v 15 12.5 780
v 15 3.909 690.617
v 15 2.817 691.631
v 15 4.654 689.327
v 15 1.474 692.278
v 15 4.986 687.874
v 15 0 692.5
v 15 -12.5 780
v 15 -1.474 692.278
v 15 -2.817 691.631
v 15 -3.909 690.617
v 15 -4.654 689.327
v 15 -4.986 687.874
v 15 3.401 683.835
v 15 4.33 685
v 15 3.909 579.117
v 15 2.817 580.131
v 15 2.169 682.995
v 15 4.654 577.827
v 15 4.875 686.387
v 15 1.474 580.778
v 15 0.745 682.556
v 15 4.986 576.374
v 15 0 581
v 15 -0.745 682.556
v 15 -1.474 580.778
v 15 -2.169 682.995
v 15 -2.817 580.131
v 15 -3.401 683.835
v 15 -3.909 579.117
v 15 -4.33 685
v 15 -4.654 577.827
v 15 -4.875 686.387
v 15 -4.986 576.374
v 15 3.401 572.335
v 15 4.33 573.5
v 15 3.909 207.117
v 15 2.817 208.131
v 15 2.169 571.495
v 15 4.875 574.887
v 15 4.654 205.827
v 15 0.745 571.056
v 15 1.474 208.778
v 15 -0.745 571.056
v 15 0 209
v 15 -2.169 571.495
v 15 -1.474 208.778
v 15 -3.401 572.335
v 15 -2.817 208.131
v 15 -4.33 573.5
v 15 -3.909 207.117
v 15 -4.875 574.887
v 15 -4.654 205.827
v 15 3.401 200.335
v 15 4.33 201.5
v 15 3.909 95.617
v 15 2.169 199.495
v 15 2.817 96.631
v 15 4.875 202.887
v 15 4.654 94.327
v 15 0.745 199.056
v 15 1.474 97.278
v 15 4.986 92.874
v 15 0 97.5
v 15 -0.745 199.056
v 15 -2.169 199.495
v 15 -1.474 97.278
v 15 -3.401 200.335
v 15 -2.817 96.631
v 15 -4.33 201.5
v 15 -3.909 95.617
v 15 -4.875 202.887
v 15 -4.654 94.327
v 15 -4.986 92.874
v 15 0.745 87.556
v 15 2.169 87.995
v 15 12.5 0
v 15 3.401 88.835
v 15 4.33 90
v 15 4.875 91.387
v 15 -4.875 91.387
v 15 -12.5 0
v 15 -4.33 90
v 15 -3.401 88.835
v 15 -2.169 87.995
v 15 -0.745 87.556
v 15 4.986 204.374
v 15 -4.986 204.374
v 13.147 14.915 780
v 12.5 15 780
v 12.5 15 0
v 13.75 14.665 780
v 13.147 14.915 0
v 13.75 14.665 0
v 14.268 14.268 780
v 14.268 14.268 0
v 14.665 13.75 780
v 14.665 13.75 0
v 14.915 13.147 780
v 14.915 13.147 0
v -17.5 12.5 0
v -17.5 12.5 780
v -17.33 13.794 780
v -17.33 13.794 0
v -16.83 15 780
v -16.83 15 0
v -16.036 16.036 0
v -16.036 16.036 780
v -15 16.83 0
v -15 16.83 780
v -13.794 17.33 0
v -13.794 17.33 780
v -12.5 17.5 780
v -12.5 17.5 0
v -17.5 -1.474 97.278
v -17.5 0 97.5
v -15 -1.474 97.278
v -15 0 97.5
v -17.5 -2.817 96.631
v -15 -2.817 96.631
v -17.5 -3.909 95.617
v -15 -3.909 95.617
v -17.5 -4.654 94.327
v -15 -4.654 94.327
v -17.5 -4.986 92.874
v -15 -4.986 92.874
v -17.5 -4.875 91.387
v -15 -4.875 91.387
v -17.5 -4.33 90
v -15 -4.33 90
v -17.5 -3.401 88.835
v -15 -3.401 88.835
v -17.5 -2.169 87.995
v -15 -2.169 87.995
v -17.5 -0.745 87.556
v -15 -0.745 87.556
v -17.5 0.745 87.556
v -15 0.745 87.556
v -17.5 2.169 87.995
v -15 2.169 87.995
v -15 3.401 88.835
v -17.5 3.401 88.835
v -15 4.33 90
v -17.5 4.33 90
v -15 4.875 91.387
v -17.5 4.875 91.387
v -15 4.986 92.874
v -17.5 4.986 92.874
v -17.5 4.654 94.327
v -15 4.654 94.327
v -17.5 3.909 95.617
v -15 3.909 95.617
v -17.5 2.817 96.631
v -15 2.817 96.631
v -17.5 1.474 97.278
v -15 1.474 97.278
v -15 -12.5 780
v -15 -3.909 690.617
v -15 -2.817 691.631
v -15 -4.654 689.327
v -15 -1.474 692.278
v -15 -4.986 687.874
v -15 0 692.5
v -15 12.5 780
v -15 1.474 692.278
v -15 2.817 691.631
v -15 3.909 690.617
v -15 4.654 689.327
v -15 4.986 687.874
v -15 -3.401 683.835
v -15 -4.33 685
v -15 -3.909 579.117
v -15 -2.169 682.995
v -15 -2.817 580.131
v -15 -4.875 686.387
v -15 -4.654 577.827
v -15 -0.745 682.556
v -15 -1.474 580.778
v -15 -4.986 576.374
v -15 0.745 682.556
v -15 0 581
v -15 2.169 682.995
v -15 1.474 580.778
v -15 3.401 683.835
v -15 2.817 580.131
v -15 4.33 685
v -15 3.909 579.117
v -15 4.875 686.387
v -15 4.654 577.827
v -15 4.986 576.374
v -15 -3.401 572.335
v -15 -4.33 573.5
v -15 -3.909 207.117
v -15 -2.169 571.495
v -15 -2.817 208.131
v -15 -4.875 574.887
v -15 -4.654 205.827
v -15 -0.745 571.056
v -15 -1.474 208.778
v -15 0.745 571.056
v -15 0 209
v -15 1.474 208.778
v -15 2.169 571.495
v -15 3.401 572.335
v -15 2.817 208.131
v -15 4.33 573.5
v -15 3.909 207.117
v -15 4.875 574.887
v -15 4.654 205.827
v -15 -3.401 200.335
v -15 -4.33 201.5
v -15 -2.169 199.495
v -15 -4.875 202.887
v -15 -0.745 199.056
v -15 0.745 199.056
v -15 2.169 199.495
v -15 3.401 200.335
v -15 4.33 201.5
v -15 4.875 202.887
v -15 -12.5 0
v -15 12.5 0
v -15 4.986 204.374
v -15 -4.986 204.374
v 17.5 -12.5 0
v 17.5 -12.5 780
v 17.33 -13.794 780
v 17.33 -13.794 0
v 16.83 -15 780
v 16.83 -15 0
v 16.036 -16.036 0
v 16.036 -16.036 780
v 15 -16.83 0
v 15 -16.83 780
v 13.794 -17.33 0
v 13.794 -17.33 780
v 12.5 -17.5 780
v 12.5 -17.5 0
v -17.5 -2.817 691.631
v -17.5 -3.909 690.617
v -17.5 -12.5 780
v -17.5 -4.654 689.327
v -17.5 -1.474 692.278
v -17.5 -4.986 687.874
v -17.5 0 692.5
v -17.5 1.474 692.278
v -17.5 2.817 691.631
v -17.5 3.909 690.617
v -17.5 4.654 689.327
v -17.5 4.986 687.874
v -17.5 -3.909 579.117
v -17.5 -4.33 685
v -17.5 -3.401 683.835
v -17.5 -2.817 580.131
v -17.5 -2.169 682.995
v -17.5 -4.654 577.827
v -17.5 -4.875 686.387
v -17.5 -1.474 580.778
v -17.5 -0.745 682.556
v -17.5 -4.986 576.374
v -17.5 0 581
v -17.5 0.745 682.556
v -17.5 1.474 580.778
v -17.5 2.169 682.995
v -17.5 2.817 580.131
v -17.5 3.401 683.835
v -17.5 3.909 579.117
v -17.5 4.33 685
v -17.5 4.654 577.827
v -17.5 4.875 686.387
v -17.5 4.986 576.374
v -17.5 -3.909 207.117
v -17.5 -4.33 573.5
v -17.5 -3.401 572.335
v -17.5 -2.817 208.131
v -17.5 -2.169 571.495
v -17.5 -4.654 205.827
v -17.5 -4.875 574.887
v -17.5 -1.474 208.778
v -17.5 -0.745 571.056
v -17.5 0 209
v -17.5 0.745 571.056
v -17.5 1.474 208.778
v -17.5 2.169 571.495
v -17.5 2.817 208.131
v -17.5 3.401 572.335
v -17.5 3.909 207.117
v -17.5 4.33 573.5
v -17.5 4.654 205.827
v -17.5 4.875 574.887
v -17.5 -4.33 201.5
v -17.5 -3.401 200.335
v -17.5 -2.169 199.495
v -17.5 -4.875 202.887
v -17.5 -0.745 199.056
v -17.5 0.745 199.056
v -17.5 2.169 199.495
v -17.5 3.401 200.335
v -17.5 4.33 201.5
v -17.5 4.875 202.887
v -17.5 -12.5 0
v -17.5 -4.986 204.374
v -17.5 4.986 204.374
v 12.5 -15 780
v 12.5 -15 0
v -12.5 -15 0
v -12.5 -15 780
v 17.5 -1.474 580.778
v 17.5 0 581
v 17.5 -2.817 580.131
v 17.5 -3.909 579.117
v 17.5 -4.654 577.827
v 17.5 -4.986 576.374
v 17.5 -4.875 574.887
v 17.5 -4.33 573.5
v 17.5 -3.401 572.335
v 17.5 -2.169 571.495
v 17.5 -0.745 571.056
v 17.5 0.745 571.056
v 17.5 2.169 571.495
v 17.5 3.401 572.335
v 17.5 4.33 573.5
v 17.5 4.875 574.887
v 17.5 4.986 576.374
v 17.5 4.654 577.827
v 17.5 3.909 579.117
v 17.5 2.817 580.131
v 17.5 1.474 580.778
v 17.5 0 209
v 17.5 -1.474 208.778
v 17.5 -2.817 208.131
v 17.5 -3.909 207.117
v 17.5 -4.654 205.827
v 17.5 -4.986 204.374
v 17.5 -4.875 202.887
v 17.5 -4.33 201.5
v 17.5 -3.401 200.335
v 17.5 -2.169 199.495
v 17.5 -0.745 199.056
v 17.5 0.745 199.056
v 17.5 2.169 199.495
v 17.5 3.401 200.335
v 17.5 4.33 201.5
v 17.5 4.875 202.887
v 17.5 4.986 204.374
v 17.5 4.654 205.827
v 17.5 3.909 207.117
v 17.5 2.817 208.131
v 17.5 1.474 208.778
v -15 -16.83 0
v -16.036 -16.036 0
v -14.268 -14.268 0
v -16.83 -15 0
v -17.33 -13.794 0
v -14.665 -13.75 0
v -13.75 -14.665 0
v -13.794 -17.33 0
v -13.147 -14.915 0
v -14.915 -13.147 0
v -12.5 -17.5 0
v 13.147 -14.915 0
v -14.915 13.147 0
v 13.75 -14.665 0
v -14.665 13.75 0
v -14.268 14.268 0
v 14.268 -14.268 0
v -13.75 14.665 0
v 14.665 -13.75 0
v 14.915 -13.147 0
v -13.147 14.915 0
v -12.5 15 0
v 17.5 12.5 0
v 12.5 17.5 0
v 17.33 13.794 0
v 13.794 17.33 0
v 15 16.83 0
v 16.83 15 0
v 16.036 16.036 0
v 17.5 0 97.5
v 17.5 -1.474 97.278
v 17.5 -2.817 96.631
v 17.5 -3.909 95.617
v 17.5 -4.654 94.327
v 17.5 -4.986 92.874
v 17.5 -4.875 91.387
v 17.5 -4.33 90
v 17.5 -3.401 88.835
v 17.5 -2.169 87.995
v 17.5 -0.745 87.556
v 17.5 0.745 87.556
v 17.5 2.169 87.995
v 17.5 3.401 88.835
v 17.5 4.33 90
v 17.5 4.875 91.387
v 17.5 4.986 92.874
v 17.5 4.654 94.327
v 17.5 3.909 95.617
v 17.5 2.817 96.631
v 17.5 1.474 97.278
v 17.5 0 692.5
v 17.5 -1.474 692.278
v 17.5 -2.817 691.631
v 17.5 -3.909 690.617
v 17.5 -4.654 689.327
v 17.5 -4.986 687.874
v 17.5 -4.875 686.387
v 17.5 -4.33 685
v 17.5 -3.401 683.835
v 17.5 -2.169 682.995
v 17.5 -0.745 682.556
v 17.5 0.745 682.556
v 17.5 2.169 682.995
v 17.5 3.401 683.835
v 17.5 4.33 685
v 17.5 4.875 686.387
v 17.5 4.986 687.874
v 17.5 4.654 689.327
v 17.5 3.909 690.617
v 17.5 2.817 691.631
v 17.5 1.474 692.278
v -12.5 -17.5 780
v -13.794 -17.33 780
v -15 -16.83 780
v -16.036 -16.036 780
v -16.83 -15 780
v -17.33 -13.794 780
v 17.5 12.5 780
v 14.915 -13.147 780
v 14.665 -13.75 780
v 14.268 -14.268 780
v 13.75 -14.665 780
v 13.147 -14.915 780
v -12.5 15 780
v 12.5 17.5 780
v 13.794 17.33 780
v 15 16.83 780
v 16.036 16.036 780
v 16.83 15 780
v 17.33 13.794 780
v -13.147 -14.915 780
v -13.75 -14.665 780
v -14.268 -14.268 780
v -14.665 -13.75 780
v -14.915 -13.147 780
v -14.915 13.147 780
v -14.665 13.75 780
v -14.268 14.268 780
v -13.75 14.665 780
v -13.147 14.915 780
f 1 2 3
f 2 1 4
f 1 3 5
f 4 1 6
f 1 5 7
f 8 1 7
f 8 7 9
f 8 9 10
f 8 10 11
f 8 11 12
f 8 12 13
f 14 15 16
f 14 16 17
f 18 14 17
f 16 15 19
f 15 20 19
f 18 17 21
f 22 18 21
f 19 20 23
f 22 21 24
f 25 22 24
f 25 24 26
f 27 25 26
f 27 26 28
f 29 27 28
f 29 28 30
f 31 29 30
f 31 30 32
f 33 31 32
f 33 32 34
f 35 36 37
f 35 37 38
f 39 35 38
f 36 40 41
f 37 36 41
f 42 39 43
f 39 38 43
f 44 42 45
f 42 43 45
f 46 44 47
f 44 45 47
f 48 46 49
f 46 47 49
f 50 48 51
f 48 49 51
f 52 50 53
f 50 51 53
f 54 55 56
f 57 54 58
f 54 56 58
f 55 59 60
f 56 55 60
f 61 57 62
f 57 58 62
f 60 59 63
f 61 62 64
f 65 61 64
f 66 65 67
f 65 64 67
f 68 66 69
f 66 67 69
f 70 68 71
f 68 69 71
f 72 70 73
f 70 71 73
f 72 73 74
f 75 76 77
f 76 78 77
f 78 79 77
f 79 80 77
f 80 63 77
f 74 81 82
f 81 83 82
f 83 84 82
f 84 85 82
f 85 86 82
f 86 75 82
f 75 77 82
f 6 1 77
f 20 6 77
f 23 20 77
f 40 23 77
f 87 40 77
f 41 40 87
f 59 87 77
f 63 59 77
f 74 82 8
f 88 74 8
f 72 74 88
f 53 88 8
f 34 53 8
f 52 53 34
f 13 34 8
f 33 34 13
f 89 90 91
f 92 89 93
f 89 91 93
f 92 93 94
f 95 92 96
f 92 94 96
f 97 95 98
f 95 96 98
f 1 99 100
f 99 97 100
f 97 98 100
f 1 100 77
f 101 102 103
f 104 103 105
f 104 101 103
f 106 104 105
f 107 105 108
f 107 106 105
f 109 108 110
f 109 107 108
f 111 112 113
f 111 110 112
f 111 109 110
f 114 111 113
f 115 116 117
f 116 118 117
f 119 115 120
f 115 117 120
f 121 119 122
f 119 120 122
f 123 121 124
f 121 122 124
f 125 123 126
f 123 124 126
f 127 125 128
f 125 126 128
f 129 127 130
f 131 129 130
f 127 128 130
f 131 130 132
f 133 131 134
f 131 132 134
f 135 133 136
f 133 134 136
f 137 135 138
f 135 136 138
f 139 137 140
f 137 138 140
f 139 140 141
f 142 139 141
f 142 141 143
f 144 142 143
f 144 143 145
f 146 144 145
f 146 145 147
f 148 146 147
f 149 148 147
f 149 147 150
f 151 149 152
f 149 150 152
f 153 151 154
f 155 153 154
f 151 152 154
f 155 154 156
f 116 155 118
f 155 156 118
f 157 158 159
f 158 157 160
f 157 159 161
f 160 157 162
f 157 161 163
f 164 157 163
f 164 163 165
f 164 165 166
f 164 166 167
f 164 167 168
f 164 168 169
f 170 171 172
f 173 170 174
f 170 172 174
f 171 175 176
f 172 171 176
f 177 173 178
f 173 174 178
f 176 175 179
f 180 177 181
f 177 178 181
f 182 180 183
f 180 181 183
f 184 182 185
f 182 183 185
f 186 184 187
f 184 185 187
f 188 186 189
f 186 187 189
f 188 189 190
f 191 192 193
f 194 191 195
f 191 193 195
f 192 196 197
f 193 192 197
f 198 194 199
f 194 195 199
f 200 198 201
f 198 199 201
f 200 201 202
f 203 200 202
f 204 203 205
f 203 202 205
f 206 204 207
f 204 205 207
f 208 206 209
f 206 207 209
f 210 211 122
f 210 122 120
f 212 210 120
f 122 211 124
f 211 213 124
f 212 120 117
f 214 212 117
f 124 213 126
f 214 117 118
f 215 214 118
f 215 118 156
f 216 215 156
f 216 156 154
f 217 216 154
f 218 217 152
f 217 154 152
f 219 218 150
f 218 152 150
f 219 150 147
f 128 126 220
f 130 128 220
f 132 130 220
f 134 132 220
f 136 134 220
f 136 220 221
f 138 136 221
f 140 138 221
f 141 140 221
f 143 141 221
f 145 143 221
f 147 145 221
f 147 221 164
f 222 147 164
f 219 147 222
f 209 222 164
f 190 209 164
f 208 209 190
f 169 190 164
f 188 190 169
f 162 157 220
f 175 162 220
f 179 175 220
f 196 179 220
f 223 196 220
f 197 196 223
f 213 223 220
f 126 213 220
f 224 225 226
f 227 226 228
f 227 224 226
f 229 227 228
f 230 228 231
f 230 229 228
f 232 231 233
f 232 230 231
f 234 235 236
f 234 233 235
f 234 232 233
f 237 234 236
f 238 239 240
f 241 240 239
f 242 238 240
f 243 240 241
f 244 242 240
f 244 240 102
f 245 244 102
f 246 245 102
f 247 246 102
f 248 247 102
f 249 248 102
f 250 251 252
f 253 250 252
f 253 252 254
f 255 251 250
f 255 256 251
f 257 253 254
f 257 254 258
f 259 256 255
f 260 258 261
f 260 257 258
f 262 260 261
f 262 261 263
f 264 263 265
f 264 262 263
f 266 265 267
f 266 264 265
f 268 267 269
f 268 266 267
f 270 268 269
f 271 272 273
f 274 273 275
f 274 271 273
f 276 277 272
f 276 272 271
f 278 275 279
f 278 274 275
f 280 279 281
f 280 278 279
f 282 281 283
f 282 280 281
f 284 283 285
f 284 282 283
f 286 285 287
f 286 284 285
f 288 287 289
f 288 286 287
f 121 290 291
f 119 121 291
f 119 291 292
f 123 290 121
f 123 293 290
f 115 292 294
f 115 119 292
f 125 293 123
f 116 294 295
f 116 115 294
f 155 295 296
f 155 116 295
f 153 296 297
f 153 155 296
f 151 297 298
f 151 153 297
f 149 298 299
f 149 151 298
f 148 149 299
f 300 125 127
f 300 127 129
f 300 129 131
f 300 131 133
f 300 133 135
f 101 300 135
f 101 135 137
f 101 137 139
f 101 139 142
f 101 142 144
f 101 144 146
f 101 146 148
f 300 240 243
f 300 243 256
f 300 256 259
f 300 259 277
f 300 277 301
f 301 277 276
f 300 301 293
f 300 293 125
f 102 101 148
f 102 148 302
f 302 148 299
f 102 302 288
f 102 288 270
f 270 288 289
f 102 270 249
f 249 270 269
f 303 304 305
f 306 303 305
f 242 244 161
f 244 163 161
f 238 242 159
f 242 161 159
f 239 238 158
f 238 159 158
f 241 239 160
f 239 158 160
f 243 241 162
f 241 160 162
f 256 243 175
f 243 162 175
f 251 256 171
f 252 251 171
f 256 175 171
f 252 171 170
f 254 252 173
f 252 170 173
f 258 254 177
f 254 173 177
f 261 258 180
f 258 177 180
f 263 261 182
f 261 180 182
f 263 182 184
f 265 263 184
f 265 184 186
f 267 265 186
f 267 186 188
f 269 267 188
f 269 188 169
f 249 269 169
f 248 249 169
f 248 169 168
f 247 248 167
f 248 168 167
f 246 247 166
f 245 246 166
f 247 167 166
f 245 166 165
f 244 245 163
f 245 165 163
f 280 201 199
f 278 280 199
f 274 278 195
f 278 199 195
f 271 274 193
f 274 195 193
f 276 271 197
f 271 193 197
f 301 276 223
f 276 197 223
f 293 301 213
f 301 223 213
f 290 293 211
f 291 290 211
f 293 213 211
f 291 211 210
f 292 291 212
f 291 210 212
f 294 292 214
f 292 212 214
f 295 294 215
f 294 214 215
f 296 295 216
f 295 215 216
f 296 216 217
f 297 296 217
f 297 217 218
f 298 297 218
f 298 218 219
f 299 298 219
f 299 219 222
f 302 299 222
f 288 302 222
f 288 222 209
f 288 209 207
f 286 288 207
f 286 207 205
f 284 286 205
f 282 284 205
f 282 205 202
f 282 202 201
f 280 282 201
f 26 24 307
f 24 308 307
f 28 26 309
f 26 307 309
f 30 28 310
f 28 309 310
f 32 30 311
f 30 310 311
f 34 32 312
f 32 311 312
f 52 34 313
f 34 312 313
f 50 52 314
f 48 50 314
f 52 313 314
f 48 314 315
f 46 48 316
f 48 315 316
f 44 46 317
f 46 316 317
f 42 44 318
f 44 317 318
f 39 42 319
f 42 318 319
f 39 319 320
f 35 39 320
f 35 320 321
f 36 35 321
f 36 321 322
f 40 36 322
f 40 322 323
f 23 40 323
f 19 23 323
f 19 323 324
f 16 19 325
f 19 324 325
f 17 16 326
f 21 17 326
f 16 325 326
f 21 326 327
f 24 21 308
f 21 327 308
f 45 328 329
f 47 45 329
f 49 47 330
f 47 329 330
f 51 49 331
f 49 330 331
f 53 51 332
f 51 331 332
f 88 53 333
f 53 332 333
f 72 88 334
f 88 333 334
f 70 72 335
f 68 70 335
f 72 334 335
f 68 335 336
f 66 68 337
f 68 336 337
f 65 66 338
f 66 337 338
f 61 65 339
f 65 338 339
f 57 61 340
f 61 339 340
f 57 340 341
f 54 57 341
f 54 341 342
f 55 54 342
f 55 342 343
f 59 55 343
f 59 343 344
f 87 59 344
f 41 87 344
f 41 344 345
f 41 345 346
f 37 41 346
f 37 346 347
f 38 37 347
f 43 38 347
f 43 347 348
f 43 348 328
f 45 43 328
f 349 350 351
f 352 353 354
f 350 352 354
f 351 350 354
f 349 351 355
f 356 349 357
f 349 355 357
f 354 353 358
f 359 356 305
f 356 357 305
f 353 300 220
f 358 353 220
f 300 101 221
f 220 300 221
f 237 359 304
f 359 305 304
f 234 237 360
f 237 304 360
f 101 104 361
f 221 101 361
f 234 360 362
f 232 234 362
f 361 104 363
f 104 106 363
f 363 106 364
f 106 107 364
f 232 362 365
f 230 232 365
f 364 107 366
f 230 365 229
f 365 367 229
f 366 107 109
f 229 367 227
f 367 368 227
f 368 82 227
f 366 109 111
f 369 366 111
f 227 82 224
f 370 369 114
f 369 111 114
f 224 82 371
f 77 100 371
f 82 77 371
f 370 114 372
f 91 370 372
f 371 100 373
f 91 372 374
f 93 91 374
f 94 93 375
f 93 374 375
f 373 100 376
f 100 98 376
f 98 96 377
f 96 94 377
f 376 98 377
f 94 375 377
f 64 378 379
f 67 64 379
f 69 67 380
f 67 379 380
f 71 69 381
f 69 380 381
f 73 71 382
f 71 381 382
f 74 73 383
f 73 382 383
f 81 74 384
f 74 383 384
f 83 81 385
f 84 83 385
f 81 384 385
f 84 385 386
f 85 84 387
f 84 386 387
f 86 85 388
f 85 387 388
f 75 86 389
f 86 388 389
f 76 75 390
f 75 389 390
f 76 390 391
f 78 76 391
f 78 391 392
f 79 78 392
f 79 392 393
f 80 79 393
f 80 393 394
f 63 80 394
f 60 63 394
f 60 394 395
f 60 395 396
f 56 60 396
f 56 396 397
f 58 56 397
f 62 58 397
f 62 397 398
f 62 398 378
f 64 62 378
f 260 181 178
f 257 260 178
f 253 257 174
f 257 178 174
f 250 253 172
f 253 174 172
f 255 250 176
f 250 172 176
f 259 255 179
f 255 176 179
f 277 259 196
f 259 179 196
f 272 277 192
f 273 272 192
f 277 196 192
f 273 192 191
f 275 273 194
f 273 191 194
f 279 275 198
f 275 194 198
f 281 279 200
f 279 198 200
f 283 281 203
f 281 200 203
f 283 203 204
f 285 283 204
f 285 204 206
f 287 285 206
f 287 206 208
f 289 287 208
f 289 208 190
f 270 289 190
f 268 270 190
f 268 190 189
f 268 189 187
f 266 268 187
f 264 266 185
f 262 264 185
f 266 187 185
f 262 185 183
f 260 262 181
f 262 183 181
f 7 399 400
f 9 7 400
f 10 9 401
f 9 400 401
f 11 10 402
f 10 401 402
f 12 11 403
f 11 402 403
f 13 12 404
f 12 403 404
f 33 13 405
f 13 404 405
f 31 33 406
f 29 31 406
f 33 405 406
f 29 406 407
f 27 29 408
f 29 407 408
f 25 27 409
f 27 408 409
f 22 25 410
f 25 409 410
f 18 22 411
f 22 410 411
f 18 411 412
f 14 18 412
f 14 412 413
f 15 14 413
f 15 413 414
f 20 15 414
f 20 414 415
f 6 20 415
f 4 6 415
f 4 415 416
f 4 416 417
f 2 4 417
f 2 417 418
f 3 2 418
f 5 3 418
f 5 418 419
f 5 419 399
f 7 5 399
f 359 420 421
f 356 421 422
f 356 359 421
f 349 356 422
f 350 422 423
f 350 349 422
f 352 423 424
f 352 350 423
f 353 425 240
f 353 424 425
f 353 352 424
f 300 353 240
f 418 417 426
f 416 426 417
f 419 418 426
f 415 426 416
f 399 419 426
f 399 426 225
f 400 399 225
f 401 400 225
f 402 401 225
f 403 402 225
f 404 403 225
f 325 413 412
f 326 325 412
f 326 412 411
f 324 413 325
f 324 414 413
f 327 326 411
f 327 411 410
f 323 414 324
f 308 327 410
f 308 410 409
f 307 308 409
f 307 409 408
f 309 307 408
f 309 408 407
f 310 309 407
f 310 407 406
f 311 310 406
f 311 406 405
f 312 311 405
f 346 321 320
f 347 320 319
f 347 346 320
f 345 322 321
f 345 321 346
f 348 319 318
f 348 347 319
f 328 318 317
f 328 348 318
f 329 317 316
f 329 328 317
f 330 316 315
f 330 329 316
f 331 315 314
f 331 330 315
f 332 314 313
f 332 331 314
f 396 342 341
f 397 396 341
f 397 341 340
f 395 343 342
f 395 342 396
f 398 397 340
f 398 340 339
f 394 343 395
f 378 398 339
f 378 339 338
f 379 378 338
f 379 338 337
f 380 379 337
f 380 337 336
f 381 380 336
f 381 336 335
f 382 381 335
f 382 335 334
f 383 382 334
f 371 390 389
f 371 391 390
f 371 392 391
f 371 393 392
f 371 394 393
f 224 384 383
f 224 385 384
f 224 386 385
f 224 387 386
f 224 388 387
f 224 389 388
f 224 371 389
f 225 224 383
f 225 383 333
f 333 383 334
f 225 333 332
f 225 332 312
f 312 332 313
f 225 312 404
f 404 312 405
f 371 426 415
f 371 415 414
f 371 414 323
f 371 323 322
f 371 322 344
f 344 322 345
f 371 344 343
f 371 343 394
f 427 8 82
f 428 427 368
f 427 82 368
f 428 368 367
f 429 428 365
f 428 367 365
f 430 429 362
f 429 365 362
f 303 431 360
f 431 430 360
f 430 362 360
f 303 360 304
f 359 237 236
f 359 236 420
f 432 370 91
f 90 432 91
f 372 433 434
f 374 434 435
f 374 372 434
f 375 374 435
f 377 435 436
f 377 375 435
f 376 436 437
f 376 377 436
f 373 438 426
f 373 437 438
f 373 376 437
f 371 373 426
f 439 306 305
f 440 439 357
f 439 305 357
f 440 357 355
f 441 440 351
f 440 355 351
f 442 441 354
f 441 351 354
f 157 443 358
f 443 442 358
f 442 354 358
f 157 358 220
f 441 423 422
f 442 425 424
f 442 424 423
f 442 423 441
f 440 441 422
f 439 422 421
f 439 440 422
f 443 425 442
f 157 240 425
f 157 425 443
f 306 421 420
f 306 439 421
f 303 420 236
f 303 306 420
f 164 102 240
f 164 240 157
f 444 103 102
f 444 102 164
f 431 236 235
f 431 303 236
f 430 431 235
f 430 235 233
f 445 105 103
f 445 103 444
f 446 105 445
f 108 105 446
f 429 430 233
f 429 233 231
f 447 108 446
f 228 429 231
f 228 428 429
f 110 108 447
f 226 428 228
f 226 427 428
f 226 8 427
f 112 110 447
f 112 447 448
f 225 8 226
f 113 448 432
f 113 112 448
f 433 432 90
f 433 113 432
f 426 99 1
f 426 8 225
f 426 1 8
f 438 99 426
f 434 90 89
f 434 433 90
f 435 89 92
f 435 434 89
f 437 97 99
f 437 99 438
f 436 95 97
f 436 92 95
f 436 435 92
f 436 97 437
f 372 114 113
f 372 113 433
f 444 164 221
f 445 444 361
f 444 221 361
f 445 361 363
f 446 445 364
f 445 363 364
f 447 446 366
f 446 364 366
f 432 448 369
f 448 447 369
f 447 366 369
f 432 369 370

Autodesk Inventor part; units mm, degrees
ref_plane "YZ Plane" through (0, 0, 0) normal (1, 0, 0) x (0, 1, 0)
ref_plane "Start plane" through (0, 0, 0) normal (0, 0, 1) x (1, 0, 0)
ref_plane "End plane" through (0, 0, 780) normal (0, 0, 1) x (1, 0, 0)
sketch "Sketch" plane through (0, 0, 0) normal (0, 0, 1) x (1, 0, 0)
  line L0 (-17.5, -12.5) -> (-17.5, 12.5)
  line L1 (-12.5, 17.5) -> (12.5, 17.5)
  line L2 (17.5, 12.5) -> (17.5, -12.5)
  line L3 (12.5, -17.5) -> (-12.5, -17.5)
  arc A0 (-17.5, -12.5) -> (-12.5, -17.5) centre (-12.5, -12.5) ccw
  arc A1 (-12.5, 17.5) -> (-17.5, 12.5) centre (-12.5, 12.5) ccw
  arc A2 (17.5, 12.5) -> (12.5, 17.5) centre (12.5, 12.5) ccw
  arc A3 (12.5, -17.5) -> (17.5, -12.5) centre (12.5, -12.5) ccw
  arc A4 (-12.5, 15) -> (-15, 12.5) centre (-12.5, 12.5) ccw
  line L4 (-12.5, 15) -> (12.5, 15)
  arc A5 (15, 12.5) -> (12.5, 15) centre (12.5, 12.5) ccw
  line L5 (15, 12.5) -> (15, -12.5)
  arc A6 (12.5, -15) -> (15, -12.5) centre (12.5, -12.5) ccw
  line L6 (12.5, -15) -> (-12.5, -15)
  arc A7 (-15, -12.5) -> (-12.5, -15) centre (-12.5, -12.5) ccw
  line L7 (-15, -12.5) -> (-15, 12.5)
  line L8 (0, 25.9497) -> (0, -25.9497) construction
  line L9 (-25.9497, 0) -> (25.9497, 0) construction
  dimension "d7" = 5
  dimension "d10" = 35
  dimension "d11" = 35
  dimension "d12" = 2.5
  dimension "d15" = 17.5
  dimension "d16" = 17.5
extrude "Body" add sketch "Sketch" along normal up to surface (780 mm away) from surface at 0
sketch "Sketch3" plane through (0, 0, 0) normal (0, 0, 1) x (1, 0, 0)
  line L0 (0, 0) -> (10, 0)
ref_plane "Work Plane3" through (0, 0, 0) normal (0, -1, 0) x (1, 0, 0)
sketch "Sketch4" plane through (0, 0, 0) normal (0, -1, 0) x (1, 0, 0)
  line L0 (-2, 0) -> (12, 0)
  line L1 (-2, 780) -> (12, 780)
  dimension "d18" = 780
sketch "Sketch5" plane through (-17.5, 12.5, 0) normal (-1, 0, 0) x (0, 0, 1)
  line L0 (780, -25) -> (780, 0) construction
  line L1 (0, 0) -> (780, 0) construction
  line L2 (0, -25) -> (0, 0) construction
  line L3 (0, -25) -> (780, -25) construction
  line L4 (17.5, -375) -> (17.5, 70) construction
  line L5 (762.5, 70) -> (762.5, 5) construction
  line L6 (0, -25) -> (780, -25) construction
  line L7 (92.5, -25) -> (92.5, 0) construction
  line L8 (204, -25) -> (204, 0) construction
  line L9 (687.5, -25) -> (687.5, 0) construction
  line L10 (576, -25) -> (576, 0) construction
  line L11 (576, -12.5) -> (687.5, -12.5) construction
  line L12 (92.5, -12.5) -> (204, -12.5) construction
  point P0 (0, -12.5)
  dimension "d19" = 75
  dimension "d20" = 111.5
  dimension "d21" = 75
  dimension "d22" = 111.5
hole "Hole1" at (-17.5, 0, 92.5) at (-17.5, 0, 204) at (-17.5, 0, 576) at (-17.5, 0, 687.5) direction (1, 0, 0) diameter 10 end through all
equation "\"d7\" = G_IR"
equation "\"d10\" = G_H"
equation "\"d11\" = G_W"
equation "\"d12\" = G_T"
equation "\"d15\" = 0.5 * d10"
equation "\"d16\" = 0.5 * d11"
equation "\"d3\" = G_L"
equation "\"G_W\" = 35"
equation "\"G_H\" = 35"
equation "\"G_T\" = 2.5"
equation "\"G_IR\" = 5"
equation "\"G_L\" = d18"
equation "\"G_OFFSET_START\" = 0"
equation "\"G_OFFSET_END\" = 0"
properties part number "AS 1163 - C350L0 35x35x2.5 SHS - 780" material "Steel, Mild"
